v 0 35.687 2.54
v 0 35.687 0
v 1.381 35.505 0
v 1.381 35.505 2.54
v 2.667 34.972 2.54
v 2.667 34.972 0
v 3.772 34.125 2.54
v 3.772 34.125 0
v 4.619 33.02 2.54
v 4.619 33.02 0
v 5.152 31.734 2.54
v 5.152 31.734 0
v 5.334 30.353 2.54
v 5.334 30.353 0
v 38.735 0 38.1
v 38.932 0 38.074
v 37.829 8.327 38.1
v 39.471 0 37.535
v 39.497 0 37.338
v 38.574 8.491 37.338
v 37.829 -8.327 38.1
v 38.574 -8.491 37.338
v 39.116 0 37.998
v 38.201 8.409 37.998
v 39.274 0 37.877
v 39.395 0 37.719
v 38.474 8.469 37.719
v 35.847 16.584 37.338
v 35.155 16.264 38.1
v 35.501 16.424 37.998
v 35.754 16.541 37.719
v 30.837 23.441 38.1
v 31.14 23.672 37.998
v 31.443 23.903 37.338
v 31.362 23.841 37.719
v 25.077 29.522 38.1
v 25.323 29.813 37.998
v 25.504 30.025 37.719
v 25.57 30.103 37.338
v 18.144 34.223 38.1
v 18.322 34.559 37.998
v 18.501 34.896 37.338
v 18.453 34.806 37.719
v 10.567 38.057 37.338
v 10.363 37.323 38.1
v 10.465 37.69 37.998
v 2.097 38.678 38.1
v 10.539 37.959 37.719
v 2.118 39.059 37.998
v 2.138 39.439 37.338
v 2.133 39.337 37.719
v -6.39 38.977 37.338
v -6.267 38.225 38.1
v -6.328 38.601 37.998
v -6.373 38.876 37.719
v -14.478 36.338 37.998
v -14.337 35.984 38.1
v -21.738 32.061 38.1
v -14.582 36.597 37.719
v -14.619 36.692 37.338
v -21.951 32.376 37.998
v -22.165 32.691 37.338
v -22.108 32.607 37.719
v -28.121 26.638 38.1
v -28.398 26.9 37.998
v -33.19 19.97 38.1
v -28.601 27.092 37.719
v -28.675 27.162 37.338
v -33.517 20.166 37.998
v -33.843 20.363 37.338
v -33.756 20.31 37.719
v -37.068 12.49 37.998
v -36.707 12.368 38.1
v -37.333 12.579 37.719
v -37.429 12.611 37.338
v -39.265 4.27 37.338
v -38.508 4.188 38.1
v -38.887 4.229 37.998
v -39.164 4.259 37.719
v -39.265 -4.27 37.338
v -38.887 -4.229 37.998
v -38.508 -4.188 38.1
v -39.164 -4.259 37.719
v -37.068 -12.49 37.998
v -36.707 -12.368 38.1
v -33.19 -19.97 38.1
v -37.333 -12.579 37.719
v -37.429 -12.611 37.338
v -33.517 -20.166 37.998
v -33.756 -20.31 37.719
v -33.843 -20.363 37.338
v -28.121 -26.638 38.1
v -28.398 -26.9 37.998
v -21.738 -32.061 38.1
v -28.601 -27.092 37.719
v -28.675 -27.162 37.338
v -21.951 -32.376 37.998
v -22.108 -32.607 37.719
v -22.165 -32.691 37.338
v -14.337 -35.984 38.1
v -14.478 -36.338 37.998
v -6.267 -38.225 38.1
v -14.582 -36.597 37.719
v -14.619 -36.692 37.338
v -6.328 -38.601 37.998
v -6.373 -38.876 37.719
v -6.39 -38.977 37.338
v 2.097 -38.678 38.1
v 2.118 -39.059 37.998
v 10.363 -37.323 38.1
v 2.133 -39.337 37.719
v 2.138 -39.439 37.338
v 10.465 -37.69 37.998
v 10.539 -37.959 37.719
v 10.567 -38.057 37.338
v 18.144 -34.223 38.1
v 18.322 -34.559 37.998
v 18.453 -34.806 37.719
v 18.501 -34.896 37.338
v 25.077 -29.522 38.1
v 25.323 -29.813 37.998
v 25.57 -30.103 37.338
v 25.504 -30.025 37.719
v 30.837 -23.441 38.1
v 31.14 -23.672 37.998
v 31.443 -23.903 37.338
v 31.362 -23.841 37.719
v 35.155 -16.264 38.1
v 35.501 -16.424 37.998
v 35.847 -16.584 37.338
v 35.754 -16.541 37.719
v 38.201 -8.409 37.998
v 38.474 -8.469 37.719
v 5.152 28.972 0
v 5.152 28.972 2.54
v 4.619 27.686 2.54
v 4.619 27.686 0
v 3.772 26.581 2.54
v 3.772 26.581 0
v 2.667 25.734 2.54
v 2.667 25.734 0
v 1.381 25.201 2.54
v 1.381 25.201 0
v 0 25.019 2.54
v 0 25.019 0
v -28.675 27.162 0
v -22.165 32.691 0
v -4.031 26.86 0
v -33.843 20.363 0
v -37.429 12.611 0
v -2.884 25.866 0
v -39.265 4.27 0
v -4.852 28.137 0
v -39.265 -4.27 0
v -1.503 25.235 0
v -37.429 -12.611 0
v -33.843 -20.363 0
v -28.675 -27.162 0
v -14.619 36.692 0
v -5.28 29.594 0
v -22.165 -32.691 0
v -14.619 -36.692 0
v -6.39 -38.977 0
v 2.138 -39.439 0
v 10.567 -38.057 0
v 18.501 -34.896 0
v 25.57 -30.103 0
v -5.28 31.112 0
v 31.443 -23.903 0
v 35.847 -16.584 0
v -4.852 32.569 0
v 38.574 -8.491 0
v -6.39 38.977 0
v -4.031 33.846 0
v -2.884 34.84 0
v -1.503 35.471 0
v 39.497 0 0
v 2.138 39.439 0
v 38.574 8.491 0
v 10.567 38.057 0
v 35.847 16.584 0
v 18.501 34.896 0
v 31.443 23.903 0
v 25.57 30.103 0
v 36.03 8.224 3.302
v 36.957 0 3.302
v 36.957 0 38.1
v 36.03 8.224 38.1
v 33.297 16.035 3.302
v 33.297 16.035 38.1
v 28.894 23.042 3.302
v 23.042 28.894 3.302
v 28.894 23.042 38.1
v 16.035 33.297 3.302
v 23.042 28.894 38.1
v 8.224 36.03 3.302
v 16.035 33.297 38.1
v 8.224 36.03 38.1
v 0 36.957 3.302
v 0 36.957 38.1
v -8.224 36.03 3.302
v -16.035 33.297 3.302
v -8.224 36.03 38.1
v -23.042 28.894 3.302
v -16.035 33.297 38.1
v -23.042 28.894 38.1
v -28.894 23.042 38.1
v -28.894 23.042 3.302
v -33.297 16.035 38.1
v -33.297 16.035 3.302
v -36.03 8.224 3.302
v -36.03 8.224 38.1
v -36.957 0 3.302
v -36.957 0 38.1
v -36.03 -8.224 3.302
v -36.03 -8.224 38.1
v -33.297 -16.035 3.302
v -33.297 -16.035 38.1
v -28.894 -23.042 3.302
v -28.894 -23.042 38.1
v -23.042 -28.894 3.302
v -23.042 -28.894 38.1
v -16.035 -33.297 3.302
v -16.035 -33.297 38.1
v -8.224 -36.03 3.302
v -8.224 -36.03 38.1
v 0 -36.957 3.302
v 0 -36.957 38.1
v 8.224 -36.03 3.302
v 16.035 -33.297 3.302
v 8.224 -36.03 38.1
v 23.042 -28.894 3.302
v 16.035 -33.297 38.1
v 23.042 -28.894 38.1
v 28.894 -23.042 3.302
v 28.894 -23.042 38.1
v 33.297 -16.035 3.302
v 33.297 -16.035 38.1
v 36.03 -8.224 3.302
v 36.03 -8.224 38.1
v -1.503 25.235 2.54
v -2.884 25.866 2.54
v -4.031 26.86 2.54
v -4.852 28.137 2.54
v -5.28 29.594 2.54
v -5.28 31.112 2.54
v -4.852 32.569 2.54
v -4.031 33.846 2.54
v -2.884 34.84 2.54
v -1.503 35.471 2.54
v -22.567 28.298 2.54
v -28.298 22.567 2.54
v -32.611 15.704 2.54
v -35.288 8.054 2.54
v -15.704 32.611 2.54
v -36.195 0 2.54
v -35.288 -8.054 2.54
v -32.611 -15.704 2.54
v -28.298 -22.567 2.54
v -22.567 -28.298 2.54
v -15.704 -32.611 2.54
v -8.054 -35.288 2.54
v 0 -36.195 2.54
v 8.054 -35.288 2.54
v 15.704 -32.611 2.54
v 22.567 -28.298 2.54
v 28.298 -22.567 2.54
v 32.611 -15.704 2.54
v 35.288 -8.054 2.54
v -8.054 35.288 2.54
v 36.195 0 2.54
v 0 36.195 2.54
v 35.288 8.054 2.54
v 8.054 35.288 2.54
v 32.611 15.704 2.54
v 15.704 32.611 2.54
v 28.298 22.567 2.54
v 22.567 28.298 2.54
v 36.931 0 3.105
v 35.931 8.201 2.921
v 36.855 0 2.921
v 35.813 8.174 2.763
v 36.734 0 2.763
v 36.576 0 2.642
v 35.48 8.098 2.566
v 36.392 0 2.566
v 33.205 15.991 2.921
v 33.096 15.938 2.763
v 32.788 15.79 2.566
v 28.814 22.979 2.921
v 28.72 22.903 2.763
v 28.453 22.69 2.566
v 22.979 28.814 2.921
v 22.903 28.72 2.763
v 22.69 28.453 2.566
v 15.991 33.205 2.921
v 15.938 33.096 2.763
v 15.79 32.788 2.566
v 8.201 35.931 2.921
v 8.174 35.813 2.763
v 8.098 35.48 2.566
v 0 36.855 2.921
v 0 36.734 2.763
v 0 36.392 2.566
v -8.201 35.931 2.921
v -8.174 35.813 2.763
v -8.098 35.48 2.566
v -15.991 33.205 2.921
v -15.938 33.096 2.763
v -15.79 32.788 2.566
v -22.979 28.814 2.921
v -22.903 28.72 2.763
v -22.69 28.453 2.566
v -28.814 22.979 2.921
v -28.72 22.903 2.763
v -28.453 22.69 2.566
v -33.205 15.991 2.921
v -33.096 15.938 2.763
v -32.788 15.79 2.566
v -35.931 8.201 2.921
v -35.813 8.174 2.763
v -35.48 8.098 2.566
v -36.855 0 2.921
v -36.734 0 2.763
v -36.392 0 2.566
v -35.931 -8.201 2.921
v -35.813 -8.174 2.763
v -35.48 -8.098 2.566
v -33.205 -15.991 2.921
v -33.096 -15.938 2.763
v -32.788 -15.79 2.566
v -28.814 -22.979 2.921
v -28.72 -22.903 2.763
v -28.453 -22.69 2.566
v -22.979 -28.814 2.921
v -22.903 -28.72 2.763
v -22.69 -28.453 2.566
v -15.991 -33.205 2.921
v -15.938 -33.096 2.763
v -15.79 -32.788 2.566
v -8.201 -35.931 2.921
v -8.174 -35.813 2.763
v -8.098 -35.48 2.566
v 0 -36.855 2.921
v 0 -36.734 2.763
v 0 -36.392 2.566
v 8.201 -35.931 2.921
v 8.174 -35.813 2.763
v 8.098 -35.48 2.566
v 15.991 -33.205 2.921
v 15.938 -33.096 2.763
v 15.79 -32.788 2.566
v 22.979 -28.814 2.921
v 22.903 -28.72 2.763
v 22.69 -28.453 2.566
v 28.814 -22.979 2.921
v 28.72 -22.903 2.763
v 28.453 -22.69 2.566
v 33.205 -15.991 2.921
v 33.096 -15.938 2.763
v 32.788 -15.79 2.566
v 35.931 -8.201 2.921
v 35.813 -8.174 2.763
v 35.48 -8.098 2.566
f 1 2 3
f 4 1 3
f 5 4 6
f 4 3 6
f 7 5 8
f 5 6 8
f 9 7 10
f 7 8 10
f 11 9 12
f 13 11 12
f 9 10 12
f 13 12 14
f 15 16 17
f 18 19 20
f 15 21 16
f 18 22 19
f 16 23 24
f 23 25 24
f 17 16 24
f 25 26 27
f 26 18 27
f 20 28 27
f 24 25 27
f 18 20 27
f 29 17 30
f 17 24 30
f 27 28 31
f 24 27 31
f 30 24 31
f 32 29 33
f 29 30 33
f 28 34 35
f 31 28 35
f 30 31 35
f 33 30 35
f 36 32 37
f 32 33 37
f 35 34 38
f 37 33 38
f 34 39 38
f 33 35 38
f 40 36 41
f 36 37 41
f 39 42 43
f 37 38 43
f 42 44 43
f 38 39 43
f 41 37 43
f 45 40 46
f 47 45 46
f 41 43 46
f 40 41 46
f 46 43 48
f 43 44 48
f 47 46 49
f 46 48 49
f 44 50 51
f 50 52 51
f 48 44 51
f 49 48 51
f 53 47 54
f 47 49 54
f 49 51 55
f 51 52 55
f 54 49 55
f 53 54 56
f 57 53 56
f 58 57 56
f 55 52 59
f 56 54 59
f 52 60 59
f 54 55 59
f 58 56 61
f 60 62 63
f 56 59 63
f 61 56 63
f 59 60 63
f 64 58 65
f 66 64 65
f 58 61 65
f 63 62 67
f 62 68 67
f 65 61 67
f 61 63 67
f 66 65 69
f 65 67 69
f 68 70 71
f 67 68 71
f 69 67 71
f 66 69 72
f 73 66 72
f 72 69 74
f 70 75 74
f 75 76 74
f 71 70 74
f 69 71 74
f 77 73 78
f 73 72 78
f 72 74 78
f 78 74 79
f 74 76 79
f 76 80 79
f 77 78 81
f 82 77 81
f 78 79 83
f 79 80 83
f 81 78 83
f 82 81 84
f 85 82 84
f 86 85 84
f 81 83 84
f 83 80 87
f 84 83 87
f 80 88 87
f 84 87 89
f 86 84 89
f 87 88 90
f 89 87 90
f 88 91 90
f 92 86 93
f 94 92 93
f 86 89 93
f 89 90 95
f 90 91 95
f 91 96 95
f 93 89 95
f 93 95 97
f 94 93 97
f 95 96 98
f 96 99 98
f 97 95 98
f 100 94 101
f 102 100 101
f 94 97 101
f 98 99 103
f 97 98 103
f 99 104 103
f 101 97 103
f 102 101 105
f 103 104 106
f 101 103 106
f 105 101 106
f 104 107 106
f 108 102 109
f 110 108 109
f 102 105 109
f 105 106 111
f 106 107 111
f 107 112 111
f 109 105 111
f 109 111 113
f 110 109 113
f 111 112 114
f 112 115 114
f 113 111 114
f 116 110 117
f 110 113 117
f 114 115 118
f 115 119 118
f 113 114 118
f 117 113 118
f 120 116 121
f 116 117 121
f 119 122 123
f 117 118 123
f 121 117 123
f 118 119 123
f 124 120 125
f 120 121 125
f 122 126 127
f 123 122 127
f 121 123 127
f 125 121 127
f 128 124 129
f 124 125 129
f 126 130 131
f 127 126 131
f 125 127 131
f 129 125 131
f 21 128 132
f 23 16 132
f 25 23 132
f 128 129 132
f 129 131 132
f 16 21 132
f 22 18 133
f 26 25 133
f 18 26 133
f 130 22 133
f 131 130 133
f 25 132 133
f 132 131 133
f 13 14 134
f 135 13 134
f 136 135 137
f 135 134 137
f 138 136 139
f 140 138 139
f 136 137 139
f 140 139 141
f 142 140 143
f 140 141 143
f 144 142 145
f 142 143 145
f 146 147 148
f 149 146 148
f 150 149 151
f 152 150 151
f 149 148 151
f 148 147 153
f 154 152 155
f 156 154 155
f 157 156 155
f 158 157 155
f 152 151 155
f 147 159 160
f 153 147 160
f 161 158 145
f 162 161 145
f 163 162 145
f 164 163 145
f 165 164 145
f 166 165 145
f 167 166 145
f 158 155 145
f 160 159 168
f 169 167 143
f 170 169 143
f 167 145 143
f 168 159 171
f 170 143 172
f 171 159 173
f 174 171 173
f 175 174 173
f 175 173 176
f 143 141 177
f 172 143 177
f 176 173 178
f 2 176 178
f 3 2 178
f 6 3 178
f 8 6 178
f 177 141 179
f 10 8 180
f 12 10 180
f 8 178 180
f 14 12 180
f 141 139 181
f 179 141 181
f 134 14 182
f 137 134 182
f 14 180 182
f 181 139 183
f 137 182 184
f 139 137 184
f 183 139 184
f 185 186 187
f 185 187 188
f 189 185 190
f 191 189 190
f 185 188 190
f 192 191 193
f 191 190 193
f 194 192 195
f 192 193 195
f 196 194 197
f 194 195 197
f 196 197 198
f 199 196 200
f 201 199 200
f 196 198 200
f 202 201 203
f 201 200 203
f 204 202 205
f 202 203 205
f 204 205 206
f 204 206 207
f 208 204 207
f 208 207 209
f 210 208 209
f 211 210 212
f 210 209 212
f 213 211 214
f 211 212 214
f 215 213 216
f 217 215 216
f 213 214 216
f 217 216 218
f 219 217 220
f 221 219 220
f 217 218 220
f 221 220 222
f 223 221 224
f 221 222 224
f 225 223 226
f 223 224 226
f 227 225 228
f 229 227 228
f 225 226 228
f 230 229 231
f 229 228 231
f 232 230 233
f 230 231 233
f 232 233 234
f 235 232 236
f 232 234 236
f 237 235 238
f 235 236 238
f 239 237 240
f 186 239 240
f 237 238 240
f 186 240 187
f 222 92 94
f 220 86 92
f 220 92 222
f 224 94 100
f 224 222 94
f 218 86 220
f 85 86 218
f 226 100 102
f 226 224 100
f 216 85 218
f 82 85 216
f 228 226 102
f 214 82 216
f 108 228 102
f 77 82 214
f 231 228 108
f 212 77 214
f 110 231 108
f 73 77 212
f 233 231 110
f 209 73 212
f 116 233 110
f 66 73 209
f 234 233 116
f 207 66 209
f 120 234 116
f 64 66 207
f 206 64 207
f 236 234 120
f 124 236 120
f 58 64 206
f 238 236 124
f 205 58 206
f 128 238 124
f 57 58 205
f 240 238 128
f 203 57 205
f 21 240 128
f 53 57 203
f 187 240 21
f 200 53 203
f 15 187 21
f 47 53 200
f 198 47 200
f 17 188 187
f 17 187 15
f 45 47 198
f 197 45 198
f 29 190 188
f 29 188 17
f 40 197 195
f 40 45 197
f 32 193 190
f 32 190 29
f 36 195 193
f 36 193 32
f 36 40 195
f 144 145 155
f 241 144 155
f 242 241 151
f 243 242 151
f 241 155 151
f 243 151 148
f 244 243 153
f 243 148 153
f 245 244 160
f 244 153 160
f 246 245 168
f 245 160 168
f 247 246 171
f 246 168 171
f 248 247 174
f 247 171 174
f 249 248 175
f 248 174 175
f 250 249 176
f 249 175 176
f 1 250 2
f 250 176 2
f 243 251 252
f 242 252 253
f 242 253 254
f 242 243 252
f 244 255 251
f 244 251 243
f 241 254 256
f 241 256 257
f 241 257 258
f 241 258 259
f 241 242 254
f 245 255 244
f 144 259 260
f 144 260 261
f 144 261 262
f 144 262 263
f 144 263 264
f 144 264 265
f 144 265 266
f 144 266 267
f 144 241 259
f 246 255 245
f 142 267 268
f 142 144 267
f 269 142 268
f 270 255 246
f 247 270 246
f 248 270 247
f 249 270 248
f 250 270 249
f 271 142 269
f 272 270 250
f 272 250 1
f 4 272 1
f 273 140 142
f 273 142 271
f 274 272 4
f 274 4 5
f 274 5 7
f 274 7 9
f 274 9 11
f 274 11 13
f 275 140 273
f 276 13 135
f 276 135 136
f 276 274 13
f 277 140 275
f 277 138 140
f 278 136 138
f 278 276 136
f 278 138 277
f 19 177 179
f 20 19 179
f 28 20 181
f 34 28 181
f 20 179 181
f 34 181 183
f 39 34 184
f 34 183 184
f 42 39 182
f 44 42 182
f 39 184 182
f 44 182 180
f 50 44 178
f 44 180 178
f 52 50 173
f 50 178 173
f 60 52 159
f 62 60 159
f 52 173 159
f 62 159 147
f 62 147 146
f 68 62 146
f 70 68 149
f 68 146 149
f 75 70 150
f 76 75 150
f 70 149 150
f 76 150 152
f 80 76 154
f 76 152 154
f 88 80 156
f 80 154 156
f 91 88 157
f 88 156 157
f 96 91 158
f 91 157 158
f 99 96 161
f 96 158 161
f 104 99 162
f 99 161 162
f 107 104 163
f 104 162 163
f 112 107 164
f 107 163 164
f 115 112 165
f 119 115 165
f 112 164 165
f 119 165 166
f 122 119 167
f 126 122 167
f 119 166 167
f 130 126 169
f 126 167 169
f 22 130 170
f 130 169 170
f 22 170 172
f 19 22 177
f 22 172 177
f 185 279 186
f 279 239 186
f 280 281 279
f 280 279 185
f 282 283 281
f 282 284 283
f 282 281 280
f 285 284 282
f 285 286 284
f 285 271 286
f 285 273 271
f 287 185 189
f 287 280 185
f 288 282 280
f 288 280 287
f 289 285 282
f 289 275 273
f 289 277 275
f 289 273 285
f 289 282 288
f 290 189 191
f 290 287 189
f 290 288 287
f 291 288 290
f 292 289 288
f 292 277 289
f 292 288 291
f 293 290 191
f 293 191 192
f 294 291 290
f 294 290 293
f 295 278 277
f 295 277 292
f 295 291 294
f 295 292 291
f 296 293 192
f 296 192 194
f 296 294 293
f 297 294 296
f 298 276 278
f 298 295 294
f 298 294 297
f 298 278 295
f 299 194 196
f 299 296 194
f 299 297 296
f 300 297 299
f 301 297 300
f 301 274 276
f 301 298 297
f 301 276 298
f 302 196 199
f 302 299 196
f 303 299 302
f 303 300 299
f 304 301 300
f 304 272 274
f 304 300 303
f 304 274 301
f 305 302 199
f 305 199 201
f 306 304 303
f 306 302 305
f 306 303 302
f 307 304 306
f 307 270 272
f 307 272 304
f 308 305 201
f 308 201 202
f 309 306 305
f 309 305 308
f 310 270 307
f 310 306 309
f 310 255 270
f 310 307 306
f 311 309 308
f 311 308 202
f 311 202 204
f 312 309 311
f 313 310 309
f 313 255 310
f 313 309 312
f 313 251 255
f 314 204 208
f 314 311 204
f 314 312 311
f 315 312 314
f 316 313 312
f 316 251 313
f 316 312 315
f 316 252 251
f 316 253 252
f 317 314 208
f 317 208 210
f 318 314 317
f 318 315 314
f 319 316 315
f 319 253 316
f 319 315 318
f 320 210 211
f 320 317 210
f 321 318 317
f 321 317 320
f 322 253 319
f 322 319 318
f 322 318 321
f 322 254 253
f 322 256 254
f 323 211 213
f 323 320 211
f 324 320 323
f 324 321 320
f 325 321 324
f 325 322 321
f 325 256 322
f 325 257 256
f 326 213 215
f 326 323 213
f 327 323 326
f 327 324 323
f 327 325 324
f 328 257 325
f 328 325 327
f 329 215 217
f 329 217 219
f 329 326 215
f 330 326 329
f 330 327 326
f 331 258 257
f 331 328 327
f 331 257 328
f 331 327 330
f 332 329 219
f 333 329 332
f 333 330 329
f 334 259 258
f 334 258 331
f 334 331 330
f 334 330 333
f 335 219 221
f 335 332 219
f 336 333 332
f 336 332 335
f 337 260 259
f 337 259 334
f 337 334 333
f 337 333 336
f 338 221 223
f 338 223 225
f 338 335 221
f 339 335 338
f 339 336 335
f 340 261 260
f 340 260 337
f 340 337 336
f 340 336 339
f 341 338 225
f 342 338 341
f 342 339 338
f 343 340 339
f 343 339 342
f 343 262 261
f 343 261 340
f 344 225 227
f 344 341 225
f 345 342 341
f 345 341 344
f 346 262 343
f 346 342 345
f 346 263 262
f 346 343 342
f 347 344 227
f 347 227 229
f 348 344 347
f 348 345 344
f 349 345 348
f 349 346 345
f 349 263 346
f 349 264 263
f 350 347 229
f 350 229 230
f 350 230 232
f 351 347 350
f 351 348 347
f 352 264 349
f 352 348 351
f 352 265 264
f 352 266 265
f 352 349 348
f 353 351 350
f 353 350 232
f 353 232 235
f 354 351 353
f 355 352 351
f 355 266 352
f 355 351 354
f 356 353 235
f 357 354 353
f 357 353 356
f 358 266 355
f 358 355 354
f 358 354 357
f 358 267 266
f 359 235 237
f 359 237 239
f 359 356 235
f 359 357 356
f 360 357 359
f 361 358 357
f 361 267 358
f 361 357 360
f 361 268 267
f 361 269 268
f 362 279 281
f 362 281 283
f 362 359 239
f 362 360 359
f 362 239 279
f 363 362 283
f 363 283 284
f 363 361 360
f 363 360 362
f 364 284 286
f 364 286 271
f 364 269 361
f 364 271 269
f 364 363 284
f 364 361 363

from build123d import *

# Parameters (mm, degrees)
F0_R     = 39.497
F1_DEPTH = 38.1
F2_R     = 36.957
F3_DEPTH = 35.56
F4_R     = 0.762
F5_R     = 0.762
F7_DEPTH = 25.4


with BuildPart() as f1:
    # F0 (on Top) → F1 (new body)
    with BuildSketch(Plane.XY):
        Circle(F0_R)
    extrude(amount=F1_DEPTH)

    # F2 (on face) → F3 (cut)
    with BuildSketch(Plane.XY.offset(38.1)):
        Circle(F2_R)
    extrude(amount=-F3_DEPTH, mode=Mode.SUBTRACT)

    # F4
    f4_edges = [f1.edges().sort_by_distance(p)[0] for p in [
        (-36.957, 0, 2.54),
    ]]
    fillet(f4_edges, radius=F4_R)

    # F5
    f5_edges = [f1.edges().sort_by_distance(p)[0] for p in [
        (-39.497, 0, 38.1),
    ]]
    fillet(f5_edges, radius=F5_R)

    # F6 (on face) → F7 (cut)
    with BuildSketch(Plane(origin=(0, 0, 0), x_dir=(1, 0, 0), z_dir=(0, 0, -1))):
        with BuildLine():
            Line((0, -25.019), (0, -30.353))
            Line((0, -30.353), (0, -35.687))
            ThreePointArc((0, -35.687), (3.771708, -34.124708), (5.334, -30.353))
            ThreePointArc((5.334, -30.353), (3.771708, -26.581292), (0, -25.019))
        make_face()
        with BuildLine():
            Line((0, -35.687), (0, -30.353))
            Line((0, -30.353), (0, -25.019))
            ThreePointArc((0, -25.019), (-5.334, -30.353), (0, -35.687))
        make_face()
    extrude(amount=-F7_DEPTH, mode=Mode.SUBTRACT)


solid = f1.part
